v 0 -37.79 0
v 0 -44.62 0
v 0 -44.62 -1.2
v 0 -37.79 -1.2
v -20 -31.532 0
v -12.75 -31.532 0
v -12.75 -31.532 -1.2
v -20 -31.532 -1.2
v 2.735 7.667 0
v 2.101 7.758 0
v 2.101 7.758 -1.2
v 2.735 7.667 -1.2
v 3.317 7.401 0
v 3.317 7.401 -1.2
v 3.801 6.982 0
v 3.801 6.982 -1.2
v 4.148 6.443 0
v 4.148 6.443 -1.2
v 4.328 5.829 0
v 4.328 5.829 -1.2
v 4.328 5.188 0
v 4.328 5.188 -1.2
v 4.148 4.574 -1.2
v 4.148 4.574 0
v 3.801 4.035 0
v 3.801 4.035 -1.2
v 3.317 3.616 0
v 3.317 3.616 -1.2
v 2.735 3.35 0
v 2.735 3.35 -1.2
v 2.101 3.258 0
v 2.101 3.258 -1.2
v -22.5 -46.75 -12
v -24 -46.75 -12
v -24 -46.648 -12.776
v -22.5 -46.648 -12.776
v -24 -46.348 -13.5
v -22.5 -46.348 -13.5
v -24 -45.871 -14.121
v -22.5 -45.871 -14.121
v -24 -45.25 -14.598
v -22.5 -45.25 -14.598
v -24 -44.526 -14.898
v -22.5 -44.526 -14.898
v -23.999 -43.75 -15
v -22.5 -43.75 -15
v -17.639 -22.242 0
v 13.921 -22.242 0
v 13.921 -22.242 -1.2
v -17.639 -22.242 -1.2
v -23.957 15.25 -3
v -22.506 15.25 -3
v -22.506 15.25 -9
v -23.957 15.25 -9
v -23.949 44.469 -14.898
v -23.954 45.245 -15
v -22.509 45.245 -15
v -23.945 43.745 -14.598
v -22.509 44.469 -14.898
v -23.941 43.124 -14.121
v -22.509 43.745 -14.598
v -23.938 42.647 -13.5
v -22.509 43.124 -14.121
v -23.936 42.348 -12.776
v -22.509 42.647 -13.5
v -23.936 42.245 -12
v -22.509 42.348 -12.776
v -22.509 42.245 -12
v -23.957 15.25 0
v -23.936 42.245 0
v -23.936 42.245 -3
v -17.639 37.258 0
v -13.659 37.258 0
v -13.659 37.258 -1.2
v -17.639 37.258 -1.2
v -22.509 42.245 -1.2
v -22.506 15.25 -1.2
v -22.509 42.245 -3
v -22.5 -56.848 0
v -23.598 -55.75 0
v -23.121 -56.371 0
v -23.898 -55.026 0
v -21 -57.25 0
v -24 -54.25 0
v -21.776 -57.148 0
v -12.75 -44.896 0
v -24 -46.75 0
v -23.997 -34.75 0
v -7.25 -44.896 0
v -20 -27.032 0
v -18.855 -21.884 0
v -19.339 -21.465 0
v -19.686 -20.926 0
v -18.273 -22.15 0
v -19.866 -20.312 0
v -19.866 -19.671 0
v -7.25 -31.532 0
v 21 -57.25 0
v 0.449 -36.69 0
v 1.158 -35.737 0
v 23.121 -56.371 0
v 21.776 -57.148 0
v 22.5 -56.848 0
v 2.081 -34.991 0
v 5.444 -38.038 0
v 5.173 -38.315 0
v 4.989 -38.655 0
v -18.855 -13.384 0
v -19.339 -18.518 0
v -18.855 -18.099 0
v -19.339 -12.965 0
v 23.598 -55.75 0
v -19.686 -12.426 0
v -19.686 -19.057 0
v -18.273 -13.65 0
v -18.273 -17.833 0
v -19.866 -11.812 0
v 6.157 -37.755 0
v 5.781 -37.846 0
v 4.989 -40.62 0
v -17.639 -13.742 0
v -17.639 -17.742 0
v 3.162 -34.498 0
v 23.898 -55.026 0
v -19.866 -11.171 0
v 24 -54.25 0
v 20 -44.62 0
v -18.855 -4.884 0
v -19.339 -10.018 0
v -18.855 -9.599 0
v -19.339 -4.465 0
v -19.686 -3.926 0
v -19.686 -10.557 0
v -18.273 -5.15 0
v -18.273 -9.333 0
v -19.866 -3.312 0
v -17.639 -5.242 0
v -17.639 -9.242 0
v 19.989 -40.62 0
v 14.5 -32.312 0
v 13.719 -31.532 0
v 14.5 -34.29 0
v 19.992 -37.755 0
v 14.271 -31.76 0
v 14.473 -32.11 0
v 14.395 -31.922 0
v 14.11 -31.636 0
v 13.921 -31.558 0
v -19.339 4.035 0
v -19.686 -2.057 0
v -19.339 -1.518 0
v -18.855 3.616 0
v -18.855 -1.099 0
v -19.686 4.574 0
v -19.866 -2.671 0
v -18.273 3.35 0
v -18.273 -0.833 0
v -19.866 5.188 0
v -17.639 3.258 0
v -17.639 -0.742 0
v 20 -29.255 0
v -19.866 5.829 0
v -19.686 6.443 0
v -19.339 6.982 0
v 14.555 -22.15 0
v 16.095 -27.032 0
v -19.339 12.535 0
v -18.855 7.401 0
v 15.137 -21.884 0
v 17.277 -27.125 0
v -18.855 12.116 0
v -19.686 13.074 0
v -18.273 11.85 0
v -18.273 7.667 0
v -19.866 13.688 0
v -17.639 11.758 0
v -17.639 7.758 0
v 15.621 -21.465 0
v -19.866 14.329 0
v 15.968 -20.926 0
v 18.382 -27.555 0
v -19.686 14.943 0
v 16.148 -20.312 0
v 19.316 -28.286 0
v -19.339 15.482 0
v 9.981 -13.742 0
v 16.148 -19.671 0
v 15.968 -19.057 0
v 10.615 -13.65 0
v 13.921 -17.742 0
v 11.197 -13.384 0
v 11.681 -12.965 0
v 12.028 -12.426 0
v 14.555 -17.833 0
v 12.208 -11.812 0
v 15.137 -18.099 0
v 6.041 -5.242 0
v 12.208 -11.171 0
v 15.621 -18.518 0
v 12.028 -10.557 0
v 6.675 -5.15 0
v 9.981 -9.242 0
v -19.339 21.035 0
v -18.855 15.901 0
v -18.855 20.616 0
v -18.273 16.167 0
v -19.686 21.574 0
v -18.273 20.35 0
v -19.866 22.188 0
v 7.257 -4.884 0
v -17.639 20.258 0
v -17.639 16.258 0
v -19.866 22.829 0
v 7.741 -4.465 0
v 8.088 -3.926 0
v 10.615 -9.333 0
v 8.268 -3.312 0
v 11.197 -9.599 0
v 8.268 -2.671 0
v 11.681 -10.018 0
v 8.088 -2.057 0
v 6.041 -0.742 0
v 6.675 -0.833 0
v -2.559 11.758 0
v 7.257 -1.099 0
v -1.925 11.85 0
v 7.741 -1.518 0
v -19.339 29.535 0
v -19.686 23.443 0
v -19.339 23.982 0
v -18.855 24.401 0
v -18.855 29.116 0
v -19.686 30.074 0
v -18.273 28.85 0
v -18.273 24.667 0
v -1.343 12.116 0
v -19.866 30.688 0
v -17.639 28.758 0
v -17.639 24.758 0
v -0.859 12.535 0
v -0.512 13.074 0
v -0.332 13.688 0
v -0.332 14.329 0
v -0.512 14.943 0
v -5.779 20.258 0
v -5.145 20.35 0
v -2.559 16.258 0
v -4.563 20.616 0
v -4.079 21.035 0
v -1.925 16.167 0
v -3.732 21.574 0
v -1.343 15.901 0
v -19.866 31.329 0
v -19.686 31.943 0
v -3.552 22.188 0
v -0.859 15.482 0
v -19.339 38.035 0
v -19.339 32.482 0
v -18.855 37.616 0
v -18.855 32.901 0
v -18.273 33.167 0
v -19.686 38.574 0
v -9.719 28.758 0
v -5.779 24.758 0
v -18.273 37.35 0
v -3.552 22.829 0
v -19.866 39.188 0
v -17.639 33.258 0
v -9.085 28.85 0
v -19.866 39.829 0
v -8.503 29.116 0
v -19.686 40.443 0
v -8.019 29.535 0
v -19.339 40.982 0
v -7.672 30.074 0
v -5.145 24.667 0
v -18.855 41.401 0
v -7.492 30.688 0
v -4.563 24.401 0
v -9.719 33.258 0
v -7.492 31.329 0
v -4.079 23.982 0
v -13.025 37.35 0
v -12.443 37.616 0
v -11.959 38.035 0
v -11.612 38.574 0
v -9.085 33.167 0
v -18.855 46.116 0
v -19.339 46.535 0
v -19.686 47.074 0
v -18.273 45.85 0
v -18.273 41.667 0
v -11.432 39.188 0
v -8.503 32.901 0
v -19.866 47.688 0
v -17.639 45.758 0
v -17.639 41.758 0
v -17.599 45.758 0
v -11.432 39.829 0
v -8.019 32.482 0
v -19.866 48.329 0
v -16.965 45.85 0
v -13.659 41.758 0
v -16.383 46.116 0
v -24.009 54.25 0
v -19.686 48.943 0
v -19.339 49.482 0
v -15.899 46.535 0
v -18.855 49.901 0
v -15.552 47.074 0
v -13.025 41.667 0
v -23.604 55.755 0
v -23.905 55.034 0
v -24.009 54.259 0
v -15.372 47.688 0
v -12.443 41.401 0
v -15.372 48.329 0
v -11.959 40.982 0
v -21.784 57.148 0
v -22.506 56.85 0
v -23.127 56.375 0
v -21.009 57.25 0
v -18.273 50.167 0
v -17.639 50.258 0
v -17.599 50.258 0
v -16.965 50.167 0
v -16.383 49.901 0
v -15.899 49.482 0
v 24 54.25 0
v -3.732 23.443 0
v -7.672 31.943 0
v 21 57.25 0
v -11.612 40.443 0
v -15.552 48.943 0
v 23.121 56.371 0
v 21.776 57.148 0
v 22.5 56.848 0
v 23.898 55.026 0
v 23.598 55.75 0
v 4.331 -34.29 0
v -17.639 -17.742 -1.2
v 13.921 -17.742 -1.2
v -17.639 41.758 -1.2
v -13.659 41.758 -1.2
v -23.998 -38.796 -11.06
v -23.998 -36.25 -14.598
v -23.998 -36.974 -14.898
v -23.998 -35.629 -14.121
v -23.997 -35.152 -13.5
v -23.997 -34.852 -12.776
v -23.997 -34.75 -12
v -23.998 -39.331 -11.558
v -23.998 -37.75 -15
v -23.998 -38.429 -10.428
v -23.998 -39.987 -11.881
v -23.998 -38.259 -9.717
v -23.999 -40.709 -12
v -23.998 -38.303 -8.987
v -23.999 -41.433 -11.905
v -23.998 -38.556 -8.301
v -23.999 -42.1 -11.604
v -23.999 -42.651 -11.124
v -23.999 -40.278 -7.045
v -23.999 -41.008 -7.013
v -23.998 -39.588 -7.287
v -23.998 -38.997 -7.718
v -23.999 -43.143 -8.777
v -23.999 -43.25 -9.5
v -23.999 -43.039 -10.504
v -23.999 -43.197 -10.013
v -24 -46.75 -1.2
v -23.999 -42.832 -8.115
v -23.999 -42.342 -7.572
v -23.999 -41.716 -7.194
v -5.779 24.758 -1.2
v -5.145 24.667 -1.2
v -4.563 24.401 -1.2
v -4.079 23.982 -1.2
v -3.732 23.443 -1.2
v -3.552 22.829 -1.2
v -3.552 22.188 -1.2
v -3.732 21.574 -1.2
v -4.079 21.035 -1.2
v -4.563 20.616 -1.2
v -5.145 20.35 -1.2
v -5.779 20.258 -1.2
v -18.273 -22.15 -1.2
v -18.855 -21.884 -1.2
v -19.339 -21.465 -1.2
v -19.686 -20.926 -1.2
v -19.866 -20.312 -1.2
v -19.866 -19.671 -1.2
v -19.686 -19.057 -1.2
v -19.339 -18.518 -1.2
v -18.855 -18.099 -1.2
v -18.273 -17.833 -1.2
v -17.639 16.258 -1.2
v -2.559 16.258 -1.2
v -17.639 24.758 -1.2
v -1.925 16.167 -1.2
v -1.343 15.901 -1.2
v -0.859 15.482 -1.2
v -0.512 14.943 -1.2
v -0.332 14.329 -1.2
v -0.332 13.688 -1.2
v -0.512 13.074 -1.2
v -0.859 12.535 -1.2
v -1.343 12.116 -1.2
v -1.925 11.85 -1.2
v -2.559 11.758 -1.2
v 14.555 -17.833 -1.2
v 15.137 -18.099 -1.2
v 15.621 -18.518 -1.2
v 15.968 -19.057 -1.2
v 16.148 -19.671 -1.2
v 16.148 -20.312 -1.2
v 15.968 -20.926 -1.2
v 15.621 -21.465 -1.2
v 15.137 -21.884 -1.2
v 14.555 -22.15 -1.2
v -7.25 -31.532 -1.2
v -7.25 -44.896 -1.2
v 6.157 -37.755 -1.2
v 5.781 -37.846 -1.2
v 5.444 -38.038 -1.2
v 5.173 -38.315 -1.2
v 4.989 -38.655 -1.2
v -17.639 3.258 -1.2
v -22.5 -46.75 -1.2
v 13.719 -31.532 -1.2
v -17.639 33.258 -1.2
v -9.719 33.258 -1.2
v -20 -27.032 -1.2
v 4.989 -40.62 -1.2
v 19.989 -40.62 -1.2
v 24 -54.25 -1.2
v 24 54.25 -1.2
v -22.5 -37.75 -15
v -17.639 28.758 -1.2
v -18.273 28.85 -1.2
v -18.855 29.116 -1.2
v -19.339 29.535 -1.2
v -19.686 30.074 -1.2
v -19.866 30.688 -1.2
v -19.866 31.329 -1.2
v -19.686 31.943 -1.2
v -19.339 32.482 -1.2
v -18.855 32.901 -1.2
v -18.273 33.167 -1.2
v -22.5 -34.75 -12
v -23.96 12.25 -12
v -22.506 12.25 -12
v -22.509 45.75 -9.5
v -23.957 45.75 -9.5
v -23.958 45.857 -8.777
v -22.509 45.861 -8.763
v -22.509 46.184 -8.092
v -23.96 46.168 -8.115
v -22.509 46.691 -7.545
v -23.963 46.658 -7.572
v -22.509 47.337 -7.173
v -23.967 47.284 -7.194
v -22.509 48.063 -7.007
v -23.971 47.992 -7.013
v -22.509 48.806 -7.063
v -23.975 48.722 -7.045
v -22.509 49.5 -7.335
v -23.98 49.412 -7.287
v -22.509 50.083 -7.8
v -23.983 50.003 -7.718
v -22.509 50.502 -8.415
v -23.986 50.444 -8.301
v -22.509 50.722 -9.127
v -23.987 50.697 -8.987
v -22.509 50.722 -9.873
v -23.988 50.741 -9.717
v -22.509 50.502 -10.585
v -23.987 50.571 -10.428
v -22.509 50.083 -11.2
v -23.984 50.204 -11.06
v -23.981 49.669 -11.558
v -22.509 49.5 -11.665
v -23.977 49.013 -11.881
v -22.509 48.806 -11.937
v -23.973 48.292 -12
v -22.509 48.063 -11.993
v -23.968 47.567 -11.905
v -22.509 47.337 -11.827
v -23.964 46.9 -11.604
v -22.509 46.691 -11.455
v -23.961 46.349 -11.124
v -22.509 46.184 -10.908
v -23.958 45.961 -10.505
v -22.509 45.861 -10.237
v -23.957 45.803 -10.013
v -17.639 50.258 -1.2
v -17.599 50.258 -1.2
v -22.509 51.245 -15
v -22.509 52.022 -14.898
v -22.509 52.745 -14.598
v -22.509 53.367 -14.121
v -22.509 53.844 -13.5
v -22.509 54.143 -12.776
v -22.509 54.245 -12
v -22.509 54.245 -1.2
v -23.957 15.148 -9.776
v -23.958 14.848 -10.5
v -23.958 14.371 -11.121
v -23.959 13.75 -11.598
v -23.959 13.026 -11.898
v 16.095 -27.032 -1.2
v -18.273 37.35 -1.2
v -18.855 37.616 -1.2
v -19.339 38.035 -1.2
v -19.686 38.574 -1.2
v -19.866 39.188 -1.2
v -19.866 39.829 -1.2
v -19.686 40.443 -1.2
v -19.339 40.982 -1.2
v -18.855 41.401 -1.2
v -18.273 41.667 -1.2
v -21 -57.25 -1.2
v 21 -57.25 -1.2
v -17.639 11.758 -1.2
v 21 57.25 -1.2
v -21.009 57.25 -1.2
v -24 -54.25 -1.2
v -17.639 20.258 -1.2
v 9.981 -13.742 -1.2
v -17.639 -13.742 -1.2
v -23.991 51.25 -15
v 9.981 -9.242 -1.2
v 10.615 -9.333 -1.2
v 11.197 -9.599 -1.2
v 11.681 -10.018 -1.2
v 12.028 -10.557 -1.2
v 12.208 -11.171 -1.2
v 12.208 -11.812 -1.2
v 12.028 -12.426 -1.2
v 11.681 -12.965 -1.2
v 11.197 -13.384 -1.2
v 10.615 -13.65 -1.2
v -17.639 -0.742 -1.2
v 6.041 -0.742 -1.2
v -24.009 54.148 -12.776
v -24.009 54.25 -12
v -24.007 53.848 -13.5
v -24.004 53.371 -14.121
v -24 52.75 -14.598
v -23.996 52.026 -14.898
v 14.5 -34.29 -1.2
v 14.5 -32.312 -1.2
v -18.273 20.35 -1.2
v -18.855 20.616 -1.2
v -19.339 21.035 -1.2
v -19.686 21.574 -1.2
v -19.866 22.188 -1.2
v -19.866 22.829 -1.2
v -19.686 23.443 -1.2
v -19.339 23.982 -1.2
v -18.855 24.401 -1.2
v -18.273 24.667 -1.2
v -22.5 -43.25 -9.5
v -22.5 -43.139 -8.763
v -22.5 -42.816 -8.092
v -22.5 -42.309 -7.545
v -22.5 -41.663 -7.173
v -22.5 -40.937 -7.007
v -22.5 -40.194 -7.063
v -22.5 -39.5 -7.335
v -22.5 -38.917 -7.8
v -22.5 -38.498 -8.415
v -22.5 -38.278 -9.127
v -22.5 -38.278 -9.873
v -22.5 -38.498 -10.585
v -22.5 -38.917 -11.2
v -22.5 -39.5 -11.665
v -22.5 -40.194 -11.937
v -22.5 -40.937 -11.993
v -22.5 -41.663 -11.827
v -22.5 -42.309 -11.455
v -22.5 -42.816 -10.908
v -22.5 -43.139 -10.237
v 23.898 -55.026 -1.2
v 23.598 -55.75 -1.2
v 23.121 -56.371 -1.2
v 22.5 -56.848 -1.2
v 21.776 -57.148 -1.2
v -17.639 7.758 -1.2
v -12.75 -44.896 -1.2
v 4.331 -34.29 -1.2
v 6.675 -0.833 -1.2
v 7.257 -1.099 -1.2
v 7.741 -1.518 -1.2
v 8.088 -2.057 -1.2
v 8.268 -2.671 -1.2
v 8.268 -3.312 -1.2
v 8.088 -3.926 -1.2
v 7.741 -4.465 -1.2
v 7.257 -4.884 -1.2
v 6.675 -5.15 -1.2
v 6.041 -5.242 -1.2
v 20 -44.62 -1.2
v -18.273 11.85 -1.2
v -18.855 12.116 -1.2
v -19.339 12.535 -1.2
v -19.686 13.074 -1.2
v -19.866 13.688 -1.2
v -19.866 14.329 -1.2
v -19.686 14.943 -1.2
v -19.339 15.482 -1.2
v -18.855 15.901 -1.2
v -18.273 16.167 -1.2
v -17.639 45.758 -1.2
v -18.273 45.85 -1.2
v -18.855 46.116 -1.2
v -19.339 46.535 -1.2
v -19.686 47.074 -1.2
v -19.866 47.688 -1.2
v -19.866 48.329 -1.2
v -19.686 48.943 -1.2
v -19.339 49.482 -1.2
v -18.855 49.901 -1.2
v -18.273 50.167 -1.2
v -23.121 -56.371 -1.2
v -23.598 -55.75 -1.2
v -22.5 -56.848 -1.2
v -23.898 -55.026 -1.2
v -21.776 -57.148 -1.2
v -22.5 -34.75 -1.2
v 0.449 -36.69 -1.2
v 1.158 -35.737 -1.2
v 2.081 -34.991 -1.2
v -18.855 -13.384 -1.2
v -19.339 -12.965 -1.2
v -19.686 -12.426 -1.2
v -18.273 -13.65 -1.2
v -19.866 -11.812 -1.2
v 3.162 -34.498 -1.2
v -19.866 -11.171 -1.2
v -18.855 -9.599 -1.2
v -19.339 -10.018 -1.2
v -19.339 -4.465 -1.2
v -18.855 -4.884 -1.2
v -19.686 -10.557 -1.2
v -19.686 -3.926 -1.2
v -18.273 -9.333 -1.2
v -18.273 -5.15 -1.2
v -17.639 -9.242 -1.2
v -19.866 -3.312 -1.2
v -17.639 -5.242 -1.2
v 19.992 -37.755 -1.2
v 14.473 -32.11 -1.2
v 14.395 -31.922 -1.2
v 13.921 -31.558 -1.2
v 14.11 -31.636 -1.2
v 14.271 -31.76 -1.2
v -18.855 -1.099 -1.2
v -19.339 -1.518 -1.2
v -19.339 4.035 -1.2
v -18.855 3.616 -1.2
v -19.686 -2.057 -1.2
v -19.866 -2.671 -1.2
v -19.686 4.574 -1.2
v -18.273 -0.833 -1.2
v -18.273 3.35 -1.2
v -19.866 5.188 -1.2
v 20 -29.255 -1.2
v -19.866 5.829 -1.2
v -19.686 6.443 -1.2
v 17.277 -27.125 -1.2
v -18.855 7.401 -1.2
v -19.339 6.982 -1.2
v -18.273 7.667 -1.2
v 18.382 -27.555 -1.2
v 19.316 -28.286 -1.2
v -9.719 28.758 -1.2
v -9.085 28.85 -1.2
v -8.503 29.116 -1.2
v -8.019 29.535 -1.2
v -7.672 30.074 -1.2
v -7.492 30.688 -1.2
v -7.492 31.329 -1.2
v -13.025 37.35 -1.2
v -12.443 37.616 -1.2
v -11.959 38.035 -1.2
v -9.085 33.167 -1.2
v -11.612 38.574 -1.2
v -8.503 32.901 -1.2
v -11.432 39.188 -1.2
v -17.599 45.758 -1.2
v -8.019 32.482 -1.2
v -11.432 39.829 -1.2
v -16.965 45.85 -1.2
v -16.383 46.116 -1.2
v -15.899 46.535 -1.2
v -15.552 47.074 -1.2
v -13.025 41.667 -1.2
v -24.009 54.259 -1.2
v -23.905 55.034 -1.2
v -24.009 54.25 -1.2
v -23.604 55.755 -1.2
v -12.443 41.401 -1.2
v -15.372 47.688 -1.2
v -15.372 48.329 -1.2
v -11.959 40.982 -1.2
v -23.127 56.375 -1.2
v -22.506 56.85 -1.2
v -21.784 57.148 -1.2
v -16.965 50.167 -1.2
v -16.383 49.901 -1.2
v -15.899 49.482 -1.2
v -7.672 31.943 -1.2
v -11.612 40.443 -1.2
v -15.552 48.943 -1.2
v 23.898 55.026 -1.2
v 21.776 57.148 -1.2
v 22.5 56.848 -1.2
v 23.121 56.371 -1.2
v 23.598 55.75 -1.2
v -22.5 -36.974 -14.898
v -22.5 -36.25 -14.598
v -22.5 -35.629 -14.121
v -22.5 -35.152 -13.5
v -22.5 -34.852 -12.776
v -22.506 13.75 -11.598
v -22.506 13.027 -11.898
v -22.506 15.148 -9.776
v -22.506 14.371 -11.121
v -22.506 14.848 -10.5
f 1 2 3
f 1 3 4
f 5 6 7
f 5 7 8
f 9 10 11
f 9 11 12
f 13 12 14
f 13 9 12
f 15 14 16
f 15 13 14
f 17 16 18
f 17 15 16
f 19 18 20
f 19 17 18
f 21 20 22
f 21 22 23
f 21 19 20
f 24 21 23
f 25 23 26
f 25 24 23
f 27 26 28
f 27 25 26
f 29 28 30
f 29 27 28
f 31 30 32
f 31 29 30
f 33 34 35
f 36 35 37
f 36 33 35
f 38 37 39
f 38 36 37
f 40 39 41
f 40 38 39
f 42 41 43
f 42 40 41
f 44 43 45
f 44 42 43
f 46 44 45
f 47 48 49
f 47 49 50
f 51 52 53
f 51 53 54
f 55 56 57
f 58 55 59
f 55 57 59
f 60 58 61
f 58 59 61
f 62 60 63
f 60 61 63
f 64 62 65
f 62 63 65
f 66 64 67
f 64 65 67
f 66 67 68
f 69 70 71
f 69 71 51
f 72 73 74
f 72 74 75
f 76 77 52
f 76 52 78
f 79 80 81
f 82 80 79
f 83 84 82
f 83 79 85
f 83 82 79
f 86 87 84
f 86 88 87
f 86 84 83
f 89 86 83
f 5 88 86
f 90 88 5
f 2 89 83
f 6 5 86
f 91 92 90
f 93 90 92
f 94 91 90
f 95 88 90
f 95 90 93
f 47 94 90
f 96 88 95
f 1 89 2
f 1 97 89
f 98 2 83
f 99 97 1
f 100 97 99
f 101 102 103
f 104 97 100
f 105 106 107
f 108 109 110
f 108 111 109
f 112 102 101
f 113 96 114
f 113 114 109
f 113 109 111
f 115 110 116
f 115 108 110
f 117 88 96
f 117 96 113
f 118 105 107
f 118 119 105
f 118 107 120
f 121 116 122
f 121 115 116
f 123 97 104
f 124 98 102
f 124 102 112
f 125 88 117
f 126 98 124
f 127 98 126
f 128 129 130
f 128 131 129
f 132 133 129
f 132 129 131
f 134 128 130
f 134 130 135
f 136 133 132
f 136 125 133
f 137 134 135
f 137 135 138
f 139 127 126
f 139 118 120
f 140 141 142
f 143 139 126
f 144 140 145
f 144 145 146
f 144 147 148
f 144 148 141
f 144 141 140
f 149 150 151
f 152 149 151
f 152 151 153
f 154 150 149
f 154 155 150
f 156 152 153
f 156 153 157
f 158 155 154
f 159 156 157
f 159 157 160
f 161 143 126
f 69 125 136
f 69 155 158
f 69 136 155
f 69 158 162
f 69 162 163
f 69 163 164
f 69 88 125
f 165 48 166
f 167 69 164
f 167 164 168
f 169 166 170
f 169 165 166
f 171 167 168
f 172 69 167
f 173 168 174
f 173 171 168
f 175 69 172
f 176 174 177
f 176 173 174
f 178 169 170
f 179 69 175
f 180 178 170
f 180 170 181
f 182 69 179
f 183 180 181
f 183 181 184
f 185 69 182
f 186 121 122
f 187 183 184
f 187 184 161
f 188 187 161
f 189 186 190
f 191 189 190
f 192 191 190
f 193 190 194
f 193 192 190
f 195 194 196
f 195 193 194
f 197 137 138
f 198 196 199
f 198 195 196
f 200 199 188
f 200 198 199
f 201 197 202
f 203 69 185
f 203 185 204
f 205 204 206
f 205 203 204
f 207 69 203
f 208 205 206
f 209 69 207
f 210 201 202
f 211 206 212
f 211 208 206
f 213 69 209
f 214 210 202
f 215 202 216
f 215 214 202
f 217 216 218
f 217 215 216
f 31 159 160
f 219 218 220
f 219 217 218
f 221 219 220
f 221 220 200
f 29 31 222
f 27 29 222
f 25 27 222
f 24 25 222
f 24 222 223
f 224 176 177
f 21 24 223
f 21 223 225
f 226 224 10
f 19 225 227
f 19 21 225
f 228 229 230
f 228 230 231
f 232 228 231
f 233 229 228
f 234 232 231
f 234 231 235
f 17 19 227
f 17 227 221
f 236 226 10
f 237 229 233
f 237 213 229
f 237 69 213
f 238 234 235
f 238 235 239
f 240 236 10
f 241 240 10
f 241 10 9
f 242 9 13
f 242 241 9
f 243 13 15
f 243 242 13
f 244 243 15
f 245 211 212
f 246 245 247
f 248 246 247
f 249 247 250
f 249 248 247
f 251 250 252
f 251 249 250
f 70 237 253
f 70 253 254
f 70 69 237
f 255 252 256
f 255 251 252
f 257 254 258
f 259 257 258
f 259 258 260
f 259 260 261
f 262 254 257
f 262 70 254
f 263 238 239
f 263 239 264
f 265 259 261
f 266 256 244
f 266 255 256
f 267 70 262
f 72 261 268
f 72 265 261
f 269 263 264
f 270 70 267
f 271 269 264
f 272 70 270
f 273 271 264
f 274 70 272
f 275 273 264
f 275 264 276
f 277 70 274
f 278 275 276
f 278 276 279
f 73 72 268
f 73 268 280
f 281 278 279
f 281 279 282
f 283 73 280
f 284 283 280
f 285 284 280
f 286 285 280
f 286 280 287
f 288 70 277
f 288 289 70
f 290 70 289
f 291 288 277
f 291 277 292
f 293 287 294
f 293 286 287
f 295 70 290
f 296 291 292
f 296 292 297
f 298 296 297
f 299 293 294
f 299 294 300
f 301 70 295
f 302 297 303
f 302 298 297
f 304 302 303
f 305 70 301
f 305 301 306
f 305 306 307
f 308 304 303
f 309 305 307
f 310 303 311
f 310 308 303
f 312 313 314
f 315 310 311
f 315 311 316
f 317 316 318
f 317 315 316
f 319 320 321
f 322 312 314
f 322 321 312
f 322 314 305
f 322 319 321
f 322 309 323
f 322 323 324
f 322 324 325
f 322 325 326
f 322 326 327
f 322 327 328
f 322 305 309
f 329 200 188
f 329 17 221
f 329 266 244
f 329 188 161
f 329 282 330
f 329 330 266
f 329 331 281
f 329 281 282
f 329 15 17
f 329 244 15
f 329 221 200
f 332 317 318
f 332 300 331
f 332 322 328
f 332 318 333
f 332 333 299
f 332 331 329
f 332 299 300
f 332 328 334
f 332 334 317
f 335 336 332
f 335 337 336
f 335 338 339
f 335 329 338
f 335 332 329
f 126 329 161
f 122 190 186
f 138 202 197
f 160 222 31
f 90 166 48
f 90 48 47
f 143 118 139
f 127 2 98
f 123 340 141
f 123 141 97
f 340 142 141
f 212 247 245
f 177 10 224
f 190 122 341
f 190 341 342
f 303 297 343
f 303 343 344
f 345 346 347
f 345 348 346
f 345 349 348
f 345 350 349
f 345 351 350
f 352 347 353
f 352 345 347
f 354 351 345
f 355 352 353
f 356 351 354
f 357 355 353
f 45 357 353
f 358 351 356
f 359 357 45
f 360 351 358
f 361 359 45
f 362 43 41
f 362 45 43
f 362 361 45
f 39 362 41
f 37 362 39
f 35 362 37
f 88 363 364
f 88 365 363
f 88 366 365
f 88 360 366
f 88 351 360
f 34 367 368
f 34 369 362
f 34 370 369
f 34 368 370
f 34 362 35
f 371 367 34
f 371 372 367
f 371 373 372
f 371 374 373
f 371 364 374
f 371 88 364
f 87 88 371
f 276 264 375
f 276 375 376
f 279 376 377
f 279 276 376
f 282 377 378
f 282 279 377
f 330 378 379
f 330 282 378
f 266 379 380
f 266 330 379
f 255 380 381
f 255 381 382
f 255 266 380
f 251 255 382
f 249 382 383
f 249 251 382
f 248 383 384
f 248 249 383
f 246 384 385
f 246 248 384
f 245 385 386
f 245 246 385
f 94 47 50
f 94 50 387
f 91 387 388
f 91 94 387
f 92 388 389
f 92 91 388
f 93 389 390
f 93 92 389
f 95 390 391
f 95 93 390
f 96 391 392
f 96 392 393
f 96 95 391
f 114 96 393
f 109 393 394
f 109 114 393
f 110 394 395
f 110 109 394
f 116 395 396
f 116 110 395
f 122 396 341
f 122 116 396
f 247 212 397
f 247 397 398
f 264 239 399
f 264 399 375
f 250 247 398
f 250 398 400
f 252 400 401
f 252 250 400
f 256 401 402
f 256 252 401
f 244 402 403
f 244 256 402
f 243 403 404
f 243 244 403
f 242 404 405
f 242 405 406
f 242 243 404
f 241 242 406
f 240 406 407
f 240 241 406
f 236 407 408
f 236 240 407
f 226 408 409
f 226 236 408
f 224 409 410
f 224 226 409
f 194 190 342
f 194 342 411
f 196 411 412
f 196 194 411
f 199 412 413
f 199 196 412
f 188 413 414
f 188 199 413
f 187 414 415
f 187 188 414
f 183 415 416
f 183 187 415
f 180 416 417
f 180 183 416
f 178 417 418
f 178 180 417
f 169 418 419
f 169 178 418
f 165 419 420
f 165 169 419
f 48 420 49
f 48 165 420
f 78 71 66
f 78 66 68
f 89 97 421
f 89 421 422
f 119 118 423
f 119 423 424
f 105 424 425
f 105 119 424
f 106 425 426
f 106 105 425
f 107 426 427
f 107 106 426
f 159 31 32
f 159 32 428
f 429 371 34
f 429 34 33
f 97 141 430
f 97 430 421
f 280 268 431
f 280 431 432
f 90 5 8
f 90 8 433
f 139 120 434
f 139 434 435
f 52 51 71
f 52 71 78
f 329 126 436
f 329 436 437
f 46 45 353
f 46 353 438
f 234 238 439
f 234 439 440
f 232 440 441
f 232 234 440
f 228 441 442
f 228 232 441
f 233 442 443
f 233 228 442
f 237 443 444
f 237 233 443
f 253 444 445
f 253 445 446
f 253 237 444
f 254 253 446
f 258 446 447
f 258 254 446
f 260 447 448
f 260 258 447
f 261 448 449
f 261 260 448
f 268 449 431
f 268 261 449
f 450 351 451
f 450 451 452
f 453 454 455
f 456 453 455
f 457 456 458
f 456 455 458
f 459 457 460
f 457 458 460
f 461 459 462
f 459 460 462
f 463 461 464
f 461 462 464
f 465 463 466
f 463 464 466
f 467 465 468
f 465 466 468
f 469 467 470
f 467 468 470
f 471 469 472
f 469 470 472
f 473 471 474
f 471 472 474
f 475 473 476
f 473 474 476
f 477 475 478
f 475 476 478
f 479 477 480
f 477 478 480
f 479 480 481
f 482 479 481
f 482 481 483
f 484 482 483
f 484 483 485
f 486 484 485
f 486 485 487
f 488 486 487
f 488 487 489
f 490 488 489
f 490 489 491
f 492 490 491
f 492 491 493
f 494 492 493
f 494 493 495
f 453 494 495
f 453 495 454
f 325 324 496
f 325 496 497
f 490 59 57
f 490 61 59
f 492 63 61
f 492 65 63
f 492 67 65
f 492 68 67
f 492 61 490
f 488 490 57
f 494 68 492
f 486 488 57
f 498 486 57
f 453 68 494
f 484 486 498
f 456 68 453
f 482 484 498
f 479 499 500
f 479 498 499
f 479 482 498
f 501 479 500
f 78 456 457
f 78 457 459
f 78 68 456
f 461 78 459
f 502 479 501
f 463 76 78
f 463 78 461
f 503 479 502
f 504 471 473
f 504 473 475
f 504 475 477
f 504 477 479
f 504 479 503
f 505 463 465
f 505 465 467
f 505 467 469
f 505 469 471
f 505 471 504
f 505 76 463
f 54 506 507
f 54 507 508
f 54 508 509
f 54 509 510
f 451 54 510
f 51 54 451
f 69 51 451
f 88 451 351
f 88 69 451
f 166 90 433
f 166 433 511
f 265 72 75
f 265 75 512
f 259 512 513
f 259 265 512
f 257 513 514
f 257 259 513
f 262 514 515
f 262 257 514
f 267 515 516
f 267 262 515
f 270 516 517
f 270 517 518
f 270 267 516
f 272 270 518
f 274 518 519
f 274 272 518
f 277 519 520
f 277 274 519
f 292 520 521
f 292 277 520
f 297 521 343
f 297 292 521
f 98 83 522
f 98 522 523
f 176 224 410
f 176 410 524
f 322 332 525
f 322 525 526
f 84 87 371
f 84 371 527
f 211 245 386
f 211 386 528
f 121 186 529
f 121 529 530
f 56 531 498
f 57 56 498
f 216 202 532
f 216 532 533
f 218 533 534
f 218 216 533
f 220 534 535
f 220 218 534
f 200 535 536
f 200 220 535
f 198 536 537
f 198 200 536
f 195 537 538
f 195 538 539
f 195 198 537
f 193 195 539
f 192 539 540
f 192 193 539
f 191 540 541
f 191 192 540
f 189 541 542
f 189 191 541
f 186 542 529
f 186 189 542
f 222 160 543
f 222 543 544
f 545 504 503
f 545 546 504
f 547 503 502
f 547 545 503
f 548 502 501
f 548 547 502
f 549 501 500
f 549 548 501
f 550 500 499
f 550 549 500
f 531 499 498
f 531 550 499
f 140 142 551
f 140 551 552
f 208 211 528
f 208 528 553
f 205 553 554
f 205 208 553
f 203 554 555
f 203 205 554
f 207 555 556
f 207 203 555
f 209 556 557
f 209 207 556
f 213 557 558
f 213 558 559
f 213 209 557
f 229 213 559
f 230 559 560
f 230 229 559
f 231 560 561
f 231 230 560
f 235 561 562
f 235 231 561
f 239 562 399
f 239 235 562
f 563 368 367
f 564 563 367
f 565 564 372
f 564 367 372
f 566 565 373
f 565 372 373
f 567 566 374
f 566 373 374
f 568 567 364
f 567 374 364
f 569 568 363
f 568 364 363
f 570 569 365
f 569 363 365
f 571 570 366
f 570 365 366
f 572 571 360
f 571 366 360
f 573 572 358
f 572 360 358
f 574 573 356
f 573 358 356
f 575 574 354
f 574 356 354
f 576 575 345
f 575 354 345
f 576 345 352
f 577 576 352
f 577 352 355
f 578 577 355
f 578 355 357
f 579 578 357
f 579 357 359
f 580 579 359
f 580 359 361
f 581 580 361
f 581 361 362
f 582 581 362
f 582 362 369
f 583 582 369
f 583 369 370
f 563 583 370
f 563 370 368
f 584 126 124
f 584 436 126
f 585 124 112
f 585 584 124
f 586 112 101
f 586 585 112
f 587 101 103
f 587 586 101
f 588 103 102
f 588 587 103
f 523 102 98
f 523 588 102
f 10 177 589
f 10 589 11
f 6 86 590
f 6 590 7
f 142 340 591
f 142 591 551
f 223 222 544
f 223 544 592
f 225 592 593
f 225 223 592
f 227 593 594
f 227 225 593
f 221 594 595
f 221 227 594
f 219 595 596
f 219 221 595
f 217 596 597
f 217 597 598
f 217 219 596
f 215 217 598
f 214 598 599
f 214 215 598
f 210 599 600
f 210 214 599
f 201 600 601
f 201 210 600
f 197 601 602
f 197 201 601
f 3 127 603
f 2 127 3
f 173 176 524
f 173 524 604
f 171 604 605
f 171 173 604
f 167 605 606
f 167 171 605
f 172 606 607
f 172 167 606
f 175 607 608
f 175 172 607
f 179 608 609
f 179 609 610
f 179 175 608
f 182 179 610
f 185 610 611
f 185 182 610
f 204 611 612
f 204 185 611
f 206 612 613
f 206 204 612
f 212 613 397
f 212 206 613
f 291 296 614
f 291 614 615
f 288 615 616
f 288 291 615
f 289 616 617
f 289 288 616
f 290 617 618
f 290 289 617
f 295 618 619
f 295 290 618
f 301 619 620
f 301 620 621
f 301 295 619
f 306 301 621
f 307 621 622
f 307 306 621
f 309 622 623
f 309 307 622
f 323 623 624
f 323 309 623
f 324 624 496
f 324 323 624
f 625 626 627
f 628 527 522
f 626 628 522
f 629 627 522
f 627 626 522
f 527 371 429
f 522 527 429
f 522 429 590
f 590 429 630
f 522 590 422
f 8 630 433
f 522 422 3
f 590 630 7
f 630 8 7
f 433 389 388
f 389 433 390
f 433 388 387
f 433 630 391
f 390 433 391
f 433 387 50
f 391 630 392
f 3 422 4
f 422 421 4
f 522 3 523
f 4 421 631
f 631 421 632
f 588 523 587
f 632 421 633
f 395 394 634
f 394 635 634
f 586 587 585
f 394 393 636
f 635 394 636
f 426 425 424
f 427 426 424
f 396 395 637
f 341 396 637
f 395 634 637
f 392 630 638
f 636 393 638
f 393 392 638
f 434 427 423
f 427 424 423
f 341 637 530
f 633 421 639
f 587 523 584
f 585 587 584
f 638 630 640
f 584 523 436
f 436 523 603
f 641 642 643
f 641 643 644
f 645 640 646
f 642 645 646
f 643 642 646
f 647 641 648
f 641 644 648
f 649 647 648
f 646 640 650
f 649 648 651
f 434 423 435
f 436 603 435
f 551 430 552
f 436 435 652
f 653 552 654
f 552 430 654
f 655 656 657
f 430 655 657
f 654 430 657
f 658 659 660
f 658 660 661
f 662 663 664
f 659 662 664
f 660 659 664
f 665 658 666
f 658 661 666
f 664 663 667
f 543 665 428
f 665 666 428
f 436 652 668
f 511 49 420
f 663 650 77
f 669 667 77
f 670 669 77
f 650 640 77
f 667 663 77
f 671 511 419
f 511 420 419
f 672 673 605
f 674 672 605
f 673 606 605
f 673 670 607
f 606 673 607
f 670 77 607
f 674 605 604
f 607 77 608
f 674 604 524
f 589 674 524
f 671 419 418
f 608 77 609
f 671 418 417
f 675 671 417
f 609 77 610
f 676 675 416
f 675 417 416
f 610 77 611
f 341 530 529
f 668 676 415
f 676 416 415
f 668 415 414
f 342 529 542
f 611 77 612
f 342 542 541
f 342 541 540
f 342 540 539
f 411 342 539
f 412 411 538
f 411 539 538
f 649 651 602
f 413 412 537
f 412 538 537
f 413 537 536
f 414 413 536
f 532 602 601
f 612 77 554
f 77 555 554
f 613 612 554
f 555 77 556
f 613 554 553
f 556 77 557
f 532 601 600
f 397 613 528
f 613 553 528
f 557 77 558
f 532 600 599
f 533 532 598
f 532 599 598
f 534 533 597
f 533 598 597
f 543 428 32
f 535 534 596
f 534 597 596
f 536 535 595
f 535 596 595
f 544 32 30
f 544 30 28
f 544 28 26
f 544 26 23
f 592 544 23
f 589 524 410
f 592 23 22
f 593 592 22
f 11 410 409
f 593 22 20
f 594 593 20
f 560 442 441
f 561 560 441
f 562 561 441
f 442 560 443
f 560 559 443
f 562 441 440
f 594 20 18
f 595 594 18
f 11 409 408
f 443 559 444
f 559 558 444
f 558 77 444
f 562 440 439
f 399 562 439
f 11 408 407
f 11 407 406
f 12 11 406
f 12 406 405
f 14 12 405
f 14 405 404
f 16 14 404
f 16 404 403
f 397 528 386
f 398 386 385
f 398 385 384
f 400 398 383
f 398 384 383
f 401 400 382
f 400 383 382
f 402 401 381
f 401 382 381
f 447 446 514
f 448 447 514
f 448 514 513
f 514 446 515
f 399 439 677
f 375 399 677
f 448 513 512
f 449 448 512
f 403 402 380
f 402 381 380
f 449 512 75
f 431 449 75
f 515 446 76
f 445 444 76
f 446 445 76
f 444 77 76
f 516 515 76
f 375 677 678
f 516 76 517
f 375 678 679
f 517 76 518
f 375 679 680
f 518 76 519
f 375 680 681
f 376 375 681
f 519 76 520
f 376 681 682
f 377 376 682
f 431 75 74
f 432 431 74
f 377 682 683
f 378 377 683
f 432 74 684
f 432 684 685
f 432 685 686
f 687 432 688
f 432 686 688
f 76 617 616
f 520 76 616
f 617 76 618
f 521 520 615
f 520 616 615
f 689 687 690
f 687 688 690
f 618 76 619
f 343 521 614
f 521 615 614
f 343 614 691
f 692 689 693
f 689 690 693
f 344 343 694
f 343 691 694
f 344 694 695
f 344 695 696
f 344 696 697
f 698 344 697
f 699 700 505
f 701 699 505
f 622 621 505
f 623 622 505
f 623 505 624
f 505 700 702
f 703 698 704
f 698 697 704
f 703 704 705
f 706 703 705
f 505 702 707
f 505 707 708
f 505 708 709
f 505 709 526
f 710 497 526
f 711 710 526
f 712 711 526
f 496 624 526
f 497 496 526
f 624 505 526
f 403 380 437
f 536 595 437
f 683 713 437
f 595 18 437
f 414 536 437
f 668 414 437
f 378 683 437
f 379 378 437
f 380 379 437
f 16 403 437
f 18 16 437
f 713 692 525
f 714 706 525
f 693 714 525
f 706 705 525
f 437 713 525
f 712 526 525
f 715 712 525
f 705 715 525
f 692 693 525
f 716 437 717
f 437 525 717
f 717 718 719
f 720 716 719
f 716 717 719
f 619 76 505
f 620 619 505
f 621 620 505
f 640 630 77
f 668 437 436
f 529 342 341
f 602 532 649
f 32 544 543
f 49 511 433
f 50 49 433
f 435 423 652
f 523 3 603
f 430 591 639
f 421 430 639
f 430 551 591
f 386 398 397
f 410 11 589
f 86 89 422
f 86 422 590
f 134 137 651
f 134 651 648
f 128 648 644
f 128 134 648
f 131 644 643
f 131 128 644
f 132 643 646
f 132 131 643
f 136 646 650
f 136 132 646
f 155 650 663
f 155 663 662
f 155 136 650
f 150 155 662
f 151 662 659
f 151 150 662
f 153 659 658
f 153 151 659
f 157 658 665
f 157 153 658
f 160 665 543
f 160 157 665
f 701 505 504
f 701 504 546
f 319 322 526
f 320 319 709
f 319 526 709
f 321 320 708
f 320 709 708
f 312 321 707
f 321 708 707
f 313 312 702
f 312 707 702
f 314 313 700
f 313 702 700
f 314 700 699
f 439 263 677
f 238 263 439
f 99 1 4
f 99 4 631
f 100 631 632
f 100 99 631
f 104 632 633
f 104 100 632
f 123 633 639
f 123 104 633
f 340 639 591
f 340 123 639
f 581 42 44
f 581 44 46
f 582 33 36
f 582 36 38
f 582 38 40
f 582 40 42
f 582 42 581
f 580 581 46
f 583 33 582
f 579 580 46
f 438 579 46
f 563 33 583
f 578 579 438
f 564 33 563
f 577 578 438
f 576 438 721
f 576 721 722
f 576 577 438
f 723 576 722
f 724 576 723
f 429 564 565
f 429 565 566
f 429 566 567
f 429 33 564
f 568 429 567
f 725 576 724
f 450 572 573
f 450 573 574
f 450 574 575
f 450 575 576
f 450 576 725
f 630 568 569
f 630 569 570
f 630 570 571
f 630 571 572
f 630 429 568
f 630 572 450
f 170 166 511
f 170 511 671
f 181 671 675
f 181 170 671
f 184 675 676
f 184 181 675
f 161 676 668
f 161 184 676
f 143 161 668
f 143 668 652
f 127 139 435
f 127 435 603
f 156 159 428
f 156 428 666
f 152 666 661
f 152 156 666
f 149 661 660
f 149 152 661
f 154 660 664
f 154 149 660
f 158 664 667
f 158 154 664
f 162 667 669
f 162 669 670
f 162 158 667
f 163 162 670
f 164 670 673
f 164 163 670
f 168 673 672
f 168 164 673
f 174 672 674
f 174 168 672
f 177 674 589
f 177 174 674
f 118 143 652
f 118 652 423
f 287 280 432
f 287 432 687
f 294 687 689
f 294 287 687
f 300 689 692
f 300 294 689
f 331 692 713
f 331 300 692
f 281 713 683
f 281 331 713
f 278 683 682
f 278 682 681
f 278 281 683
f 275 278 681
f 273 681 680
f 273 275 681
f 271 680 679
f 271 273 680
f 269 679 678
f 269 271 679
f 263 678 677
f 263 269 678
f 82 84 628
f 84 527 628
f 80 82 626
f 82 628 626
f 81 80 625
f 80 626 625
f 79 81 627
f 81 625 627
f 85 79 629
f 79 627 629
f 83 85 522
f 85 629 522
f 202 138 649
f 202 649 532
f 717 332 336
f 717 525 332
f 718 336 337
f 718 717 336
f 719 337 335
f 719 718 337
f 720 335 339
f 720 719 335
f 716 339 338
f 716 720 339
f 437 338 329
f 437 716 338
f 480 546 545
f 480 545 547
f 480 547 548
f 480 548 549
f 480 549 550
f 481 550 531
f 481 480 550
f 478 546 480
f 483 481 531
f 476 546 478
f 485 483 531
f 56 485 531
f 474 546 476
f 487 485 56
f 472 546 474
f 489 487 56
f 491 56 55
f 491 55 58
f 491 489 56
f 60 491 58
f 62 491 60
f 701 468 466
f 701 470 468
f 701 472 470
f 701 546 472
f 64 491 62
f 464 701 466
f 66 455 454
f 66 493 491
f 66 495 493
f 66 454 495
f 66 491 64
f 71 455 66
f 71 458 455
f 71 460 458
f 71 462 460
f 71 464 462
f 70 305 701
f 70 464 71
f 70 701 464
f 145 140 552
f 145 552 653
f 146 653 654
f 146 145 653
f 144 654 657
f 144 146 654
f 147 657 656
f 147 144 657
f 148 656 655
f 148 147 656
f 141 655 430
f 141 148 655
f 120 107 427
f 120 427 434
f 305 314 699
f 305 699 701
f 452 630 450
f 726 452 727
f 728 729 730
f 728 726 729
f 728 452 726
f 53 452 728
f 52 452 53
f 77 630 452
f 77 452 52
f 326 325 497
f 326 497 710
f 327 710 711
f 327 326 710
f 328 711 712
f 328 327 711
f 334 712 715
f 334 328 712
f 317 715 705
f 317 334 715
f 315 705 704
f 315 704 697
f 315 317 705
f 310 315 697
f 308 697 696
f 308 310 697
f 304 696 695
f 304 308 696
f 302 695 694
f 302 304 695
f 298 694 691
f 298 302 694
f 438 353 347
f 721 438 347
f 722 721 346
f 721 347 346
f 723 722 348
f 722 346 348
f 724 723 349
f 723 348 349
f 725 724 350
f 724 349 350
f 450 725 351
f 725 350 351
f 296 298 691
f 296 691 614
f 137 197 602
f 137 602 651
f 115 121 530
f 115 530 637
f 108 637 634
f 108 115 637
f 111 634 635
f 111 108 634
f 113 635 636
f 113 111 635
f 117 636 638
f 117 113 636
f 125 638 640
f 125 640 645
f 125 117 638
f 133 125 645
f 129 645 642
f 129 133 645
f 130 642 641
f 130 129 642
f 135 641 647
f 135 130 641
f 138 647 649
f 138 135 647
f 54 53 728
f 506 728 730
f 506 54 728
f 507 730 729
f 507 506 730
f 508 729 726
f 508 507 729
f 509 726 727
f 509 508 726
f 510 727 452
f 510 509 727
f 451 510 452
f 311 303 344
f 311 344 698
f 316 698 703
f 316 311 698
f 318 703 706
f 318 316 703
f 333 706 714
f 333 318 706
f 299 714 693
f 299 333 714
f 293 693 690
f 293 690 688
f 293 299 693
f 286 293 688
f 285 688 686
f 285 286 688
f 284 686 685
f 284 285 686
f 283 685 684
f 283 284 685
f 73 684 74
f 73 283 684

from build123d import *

# Parameters (mm, degrees)
F1_DEPTH = 1.2
F2_DEPTH = 15
F4_D     = 5
F5_R     = 3
F6_DEPTH = 3
F7_DEPTH = 12
F8_R     = 3


# Not quite as in the source:
# - a feature names something its author has since deleted; it is built from what else it names


with BuildPart() as f1:
    # F0 (on Top) → F1 (new body)
    with BuildSketch(Plane.XY):
        Polygon((24, 57.25), (-24, 57.25), (-24.0091441598, 54.25), (-22.5091511277, 54.2454279414), (-22.5091511277, 42.2454279414), (-22.5059426621, 15.2501562063), (-22.5, -34.75), (-22.5, -46.75), (-24, -46.75), (-24, -57.25), (24, -57.25), align=None)
        with BuildLine():
            Line((13.9209458456, -22.2416133583), (-17.6390541544, -22.2416133583))
            ThreePointArc((-17.6390541544, -22.2416133583), (-19.8890541544, -19.9916133583), (-17.6390541544, -17.7416133583))
            Line((-17.6390541544, -17.7416133583), (13.9209458456, -17.7416133583))
            ThreePointArc((13.9209458456, -17.7416133583), (16.1709458456, -19.9916133583), (13.9209458456, -22.2416133583))
        make_face(mode=Mode.SUBTRACT)
        with BuildLine():
            Line((9.9809458456, -13.7416133583), (-17.6390541544, -13.7416133583))
            ThreePointArc((-17.6390541544, -13.7416133583), (-19.8890541544, -11.4916133583), (-17.6390541544, -9.2416133583))
            Line((-17.6390541544, -9.2416133583), (9.9809458456, -9.2416133583))
            ThreePointArc((9.9809458456, -9.2416133583), (12.2309458456, -11.4916133583), (9.9809458456, -13.7416133583))
        make_face(mode=Mode.SUBTRACT)
        with BuildLine():
            Line((6.0409458456, -5.2416133583), (-17.6390541544, -5.2416133583))
            ThreePointArc((-17.6390541544, -5.2416133583), (-19.8890541544, -2.9916133583), (-17.6390541544, -0.7416133583))
            Line((-17.6390541544, -0.7416133583), (6.0409458456, -0.7416133583))
            ThreePointArc((6.0409458456, -0.7416133583), (8.2909458456, -2.9916133583), (6.0409458456, -5.2416133583))
        make_face(mode=Mode.SUBTRACT)
        with BuildLine():
            Line((-19.9999999992, -31.5317022603), (-19.9999999992, -27.0317022603))
            Line((-19.9999999992, -27.0317022603), (16.0951670268, -27.0317022603))
            ThreePointArc((16.0951670268, -27.0317022603), (18.3824934665, -27.555243649), (19.9999999704, -29.25513498))
            Line((19.9999999704, -29.25513498), (19.991580365, -37.75513498))
            Line((19.991580365, -37.75513498), (6.1573753969, -37.7551350426))
            ThreePointArc((6.1573753969, -37.7551350426), (5.4441089744, -38.037790108), (4.9890264818, -38.6554816172))
            Line((4.9890264818, -38.6554816172), (4.9890264818, -40.6197120801))
            Line((4.9890264818, -40.6197120801), (19.9890264818, -40.6197120801))
            Line((19.9890264818, -40.6197120801), (20, -44.6197120801))
            Line((20, -44.6197120801), (0, -44.6197120801))
            Line((0, -44.6197120801), (0, -37.7900532508))
            ThreePointArc((0, -37.7900532508), (1.5958871284, -35.3350022858), (4.3312619815, -34.2900834468))
            Line((4.3312619815, -34.2900834468), (14.5000001306, -34.2900834468))
            Line((14.5000001306, -34.2900834468), (14.5000000048, -32.3122422563))
            ThreePointArc((14.5000000048, -32.3122422563), (14.2713851276, -31.7603171319), (13.7194600008, -31.5317022603))
            Line((13.7194600008, -31.5317022603), (-7.2499999992, -31.5317022603))
            Line((-7.2499999992, -31.5317022603), (-7.2499999992, -44.8960133593))
            Line((-7.2499999992, -44.8960133593), (-12.7499999992, -44.8960133593))
            Line((-12.7499999992, -44.8960133593), (-12.7499999992, -31.5317022603))
            Line((-12.7499999992, -31.5317022603), (-19.9999999992, -31.5317022603))
        make_face(mode=Mode.SUBTRACT)
        with BuildLine():
            Line((2.1009458456, 3.2583866417), (-17.6390541544, 3.2583866417))
            ThreePointArc((-17.6390541544, 3.2583866417), (-19.8890541544, 5.5083866417), (-17.6390541544, 7.7583866417))
            Line((-17.6390541544, 7.7583866417), (2.1009458456, 7.7583866417))
            ThreePointArc((2.1009458456, 7.7583866417), (4.3509458456, 5.5083866417), (2.1009458456, 3.2583866417))
        make_face(mode=Mode.SUBTRACT)
        with BuildLine():
            Line((-2.5590541544, 11.7583866417), (-17.6390541544, 11.7583866417))
            ThreePointArc((-17.6390541544, 11.7583866417), (-19.8890541544, 14.0083866417), (-17.6390541544, 16.2583866417))
            Line((-17.6390541544, 16.2583866417), (-2.5590541544, 16.2583866417))
            ThreePointArc((-2.5590541544, 16.2583866417), (-0.3090541544, 14.0083866417), (-2.5590541544, 11.7583866417))
        make_face(mode=Mode.SUBTRACT)
        with BuildLine():
            Line((-5.7790541544, 20.2583866417), (-17.6390541544, 20.2583866417))
            ThreePointArc((-17.6390541544, 20.2583866417), (-19.8890541544, 22.5083866417), (-17.6390541544, 24.7583866417))
            Line((-17.6390541544, 24.7583866417), (-5.7790541544, 24.7583866417))
            ThreePointArc((-5.7790541544, 24.7583866417), (-3.5290541544, 22.5083866417), (-5.7790541544, 20.2583866417))
        make_face(mode=Mode.SUBTRACT)
        with BuildLine():
            Line((-9.7190541544, 28.7583866417), (-17.6390541544, 28.7583866417))
            ThreePointArc((-17.6390541544, 28.7583866417), (-19.8890541544, 31.0083866417), (-17.6390541544, 33.2583866417))
            Line((-17.6390541544, 33.2583866417), (-9.7190541544, 33.2583866417))
            ThreePointArc((-9.7190541544, 33.2583866417), (-7.4690541544, 31.0083866417), (-9.7190541544, 28.7583866417))
        make_face(mode=Mode.SUBTRACT)
        with BuildLine():
            Line((-13.6590541544, 37.2583866417), (-17.6390541544, 37.2583866417))
            ThreePointArc((-17.6390541544, 37.2583866417), (-19.8890541544, 39.5083866417), (-17.6390541544, 41.7583866417))
            Line((-17.6390541544, 41.7583866417), (-13.6590541544, 41.7583866417))
            ThreePointArc((-13.6590541544, 41.7583866417), (-11.4090541544, 39.5083866417), (-13.6590541544, 37.2583866417))
        make_face(mode=Mode.SUBTRACT)
        with BuildLine():
            Line((-17.5990541544, 45.7583866417), (-17.6390541544, 45.7583866417))
            ThreePointArc((-17.6390541544, 45.7583866417), (-19.8890541544, 48.0083866417), (-17.6390541544, 50.2583866417))
            Line((-17.6390541544, 50.2583866417), (-17.5990541544, 50.2583866417))
            ThreePointArc((-17.5990541544, 50.2583866417), (-15.3490541544, 48.0083866417), (-17.5990541544, 45.7583866417))
        make_face(mode=Mode.SUBTRACT)
    extrude(amount=-F1_DEPTH)

    # F0 (on Top) → F2 (join)
    with BuildSketch(Plane.XY):
        Polygon((-22.5091511277, 54.2454279414), (-24.0091441598, 54.25), (-23.9357289877, 42.2454279414), (-22.5091511277, 42.2454279414), align=None)
        Polygon((-23.997312058, -34.750000301), (-24, -46.75), (-22.5, -46.75), (-22.5, -34.75), align=None)
    extrude(amount=-F2_DEPTH)

    # F4 (through all)
    with Locations(Plane.YZ):
        with Locations((-40.75, -9.5), (48.25, -9.5)):
            Hole(F4_D / 2)

    # F5
    f5_edges = [f1.edges().sort_by_distance(p)[0] for p in [
        (-23.22244, 42.245428, -15),
        (-23.259148, 54.247714, -15),
        (-23.248656, -34.75, -15),
        (-23.25, -46.75, -15),
    ]]
    fillet(f5_edges, radius=F5_R)

    # F0 (on Top) → F6 (join)
    with BuildSketch(Plane.XY):
        Polygon((-22.5091511277, 42.2454279414), (-23.9357289877, 42.2454279414), (-23.9573206897, 15.2499837059), (-22.5059426621, 15.2501562063), align=None)
    extrude(amount=-F6_DEPTH)

    # F0 (on Top) → F7 (join)
    with BuildSketch(Plane.XY):
        Polygon((-22.5059426621, 15.2501562063), (-23.9573206897, 15.2499837059), (-23.997312058, -34.750000301), (-22.5, -34.75), align=None)
    extrude(amount=-F7_DEPTH)

    # F8
    f8_edges = [f1.edges().sort_by_distance(p)[0] for p in [
        (-23.231632, 15.25007, -12),
        (24, 57.25, -0.6),
        (-24, 57.25, -0.6),
        (-24, -57.25, -0.6),
        (24, -57.25, -0.6),
    ]]
    fillet(f8_edges, radius=F8_R)


solid = f1.part
